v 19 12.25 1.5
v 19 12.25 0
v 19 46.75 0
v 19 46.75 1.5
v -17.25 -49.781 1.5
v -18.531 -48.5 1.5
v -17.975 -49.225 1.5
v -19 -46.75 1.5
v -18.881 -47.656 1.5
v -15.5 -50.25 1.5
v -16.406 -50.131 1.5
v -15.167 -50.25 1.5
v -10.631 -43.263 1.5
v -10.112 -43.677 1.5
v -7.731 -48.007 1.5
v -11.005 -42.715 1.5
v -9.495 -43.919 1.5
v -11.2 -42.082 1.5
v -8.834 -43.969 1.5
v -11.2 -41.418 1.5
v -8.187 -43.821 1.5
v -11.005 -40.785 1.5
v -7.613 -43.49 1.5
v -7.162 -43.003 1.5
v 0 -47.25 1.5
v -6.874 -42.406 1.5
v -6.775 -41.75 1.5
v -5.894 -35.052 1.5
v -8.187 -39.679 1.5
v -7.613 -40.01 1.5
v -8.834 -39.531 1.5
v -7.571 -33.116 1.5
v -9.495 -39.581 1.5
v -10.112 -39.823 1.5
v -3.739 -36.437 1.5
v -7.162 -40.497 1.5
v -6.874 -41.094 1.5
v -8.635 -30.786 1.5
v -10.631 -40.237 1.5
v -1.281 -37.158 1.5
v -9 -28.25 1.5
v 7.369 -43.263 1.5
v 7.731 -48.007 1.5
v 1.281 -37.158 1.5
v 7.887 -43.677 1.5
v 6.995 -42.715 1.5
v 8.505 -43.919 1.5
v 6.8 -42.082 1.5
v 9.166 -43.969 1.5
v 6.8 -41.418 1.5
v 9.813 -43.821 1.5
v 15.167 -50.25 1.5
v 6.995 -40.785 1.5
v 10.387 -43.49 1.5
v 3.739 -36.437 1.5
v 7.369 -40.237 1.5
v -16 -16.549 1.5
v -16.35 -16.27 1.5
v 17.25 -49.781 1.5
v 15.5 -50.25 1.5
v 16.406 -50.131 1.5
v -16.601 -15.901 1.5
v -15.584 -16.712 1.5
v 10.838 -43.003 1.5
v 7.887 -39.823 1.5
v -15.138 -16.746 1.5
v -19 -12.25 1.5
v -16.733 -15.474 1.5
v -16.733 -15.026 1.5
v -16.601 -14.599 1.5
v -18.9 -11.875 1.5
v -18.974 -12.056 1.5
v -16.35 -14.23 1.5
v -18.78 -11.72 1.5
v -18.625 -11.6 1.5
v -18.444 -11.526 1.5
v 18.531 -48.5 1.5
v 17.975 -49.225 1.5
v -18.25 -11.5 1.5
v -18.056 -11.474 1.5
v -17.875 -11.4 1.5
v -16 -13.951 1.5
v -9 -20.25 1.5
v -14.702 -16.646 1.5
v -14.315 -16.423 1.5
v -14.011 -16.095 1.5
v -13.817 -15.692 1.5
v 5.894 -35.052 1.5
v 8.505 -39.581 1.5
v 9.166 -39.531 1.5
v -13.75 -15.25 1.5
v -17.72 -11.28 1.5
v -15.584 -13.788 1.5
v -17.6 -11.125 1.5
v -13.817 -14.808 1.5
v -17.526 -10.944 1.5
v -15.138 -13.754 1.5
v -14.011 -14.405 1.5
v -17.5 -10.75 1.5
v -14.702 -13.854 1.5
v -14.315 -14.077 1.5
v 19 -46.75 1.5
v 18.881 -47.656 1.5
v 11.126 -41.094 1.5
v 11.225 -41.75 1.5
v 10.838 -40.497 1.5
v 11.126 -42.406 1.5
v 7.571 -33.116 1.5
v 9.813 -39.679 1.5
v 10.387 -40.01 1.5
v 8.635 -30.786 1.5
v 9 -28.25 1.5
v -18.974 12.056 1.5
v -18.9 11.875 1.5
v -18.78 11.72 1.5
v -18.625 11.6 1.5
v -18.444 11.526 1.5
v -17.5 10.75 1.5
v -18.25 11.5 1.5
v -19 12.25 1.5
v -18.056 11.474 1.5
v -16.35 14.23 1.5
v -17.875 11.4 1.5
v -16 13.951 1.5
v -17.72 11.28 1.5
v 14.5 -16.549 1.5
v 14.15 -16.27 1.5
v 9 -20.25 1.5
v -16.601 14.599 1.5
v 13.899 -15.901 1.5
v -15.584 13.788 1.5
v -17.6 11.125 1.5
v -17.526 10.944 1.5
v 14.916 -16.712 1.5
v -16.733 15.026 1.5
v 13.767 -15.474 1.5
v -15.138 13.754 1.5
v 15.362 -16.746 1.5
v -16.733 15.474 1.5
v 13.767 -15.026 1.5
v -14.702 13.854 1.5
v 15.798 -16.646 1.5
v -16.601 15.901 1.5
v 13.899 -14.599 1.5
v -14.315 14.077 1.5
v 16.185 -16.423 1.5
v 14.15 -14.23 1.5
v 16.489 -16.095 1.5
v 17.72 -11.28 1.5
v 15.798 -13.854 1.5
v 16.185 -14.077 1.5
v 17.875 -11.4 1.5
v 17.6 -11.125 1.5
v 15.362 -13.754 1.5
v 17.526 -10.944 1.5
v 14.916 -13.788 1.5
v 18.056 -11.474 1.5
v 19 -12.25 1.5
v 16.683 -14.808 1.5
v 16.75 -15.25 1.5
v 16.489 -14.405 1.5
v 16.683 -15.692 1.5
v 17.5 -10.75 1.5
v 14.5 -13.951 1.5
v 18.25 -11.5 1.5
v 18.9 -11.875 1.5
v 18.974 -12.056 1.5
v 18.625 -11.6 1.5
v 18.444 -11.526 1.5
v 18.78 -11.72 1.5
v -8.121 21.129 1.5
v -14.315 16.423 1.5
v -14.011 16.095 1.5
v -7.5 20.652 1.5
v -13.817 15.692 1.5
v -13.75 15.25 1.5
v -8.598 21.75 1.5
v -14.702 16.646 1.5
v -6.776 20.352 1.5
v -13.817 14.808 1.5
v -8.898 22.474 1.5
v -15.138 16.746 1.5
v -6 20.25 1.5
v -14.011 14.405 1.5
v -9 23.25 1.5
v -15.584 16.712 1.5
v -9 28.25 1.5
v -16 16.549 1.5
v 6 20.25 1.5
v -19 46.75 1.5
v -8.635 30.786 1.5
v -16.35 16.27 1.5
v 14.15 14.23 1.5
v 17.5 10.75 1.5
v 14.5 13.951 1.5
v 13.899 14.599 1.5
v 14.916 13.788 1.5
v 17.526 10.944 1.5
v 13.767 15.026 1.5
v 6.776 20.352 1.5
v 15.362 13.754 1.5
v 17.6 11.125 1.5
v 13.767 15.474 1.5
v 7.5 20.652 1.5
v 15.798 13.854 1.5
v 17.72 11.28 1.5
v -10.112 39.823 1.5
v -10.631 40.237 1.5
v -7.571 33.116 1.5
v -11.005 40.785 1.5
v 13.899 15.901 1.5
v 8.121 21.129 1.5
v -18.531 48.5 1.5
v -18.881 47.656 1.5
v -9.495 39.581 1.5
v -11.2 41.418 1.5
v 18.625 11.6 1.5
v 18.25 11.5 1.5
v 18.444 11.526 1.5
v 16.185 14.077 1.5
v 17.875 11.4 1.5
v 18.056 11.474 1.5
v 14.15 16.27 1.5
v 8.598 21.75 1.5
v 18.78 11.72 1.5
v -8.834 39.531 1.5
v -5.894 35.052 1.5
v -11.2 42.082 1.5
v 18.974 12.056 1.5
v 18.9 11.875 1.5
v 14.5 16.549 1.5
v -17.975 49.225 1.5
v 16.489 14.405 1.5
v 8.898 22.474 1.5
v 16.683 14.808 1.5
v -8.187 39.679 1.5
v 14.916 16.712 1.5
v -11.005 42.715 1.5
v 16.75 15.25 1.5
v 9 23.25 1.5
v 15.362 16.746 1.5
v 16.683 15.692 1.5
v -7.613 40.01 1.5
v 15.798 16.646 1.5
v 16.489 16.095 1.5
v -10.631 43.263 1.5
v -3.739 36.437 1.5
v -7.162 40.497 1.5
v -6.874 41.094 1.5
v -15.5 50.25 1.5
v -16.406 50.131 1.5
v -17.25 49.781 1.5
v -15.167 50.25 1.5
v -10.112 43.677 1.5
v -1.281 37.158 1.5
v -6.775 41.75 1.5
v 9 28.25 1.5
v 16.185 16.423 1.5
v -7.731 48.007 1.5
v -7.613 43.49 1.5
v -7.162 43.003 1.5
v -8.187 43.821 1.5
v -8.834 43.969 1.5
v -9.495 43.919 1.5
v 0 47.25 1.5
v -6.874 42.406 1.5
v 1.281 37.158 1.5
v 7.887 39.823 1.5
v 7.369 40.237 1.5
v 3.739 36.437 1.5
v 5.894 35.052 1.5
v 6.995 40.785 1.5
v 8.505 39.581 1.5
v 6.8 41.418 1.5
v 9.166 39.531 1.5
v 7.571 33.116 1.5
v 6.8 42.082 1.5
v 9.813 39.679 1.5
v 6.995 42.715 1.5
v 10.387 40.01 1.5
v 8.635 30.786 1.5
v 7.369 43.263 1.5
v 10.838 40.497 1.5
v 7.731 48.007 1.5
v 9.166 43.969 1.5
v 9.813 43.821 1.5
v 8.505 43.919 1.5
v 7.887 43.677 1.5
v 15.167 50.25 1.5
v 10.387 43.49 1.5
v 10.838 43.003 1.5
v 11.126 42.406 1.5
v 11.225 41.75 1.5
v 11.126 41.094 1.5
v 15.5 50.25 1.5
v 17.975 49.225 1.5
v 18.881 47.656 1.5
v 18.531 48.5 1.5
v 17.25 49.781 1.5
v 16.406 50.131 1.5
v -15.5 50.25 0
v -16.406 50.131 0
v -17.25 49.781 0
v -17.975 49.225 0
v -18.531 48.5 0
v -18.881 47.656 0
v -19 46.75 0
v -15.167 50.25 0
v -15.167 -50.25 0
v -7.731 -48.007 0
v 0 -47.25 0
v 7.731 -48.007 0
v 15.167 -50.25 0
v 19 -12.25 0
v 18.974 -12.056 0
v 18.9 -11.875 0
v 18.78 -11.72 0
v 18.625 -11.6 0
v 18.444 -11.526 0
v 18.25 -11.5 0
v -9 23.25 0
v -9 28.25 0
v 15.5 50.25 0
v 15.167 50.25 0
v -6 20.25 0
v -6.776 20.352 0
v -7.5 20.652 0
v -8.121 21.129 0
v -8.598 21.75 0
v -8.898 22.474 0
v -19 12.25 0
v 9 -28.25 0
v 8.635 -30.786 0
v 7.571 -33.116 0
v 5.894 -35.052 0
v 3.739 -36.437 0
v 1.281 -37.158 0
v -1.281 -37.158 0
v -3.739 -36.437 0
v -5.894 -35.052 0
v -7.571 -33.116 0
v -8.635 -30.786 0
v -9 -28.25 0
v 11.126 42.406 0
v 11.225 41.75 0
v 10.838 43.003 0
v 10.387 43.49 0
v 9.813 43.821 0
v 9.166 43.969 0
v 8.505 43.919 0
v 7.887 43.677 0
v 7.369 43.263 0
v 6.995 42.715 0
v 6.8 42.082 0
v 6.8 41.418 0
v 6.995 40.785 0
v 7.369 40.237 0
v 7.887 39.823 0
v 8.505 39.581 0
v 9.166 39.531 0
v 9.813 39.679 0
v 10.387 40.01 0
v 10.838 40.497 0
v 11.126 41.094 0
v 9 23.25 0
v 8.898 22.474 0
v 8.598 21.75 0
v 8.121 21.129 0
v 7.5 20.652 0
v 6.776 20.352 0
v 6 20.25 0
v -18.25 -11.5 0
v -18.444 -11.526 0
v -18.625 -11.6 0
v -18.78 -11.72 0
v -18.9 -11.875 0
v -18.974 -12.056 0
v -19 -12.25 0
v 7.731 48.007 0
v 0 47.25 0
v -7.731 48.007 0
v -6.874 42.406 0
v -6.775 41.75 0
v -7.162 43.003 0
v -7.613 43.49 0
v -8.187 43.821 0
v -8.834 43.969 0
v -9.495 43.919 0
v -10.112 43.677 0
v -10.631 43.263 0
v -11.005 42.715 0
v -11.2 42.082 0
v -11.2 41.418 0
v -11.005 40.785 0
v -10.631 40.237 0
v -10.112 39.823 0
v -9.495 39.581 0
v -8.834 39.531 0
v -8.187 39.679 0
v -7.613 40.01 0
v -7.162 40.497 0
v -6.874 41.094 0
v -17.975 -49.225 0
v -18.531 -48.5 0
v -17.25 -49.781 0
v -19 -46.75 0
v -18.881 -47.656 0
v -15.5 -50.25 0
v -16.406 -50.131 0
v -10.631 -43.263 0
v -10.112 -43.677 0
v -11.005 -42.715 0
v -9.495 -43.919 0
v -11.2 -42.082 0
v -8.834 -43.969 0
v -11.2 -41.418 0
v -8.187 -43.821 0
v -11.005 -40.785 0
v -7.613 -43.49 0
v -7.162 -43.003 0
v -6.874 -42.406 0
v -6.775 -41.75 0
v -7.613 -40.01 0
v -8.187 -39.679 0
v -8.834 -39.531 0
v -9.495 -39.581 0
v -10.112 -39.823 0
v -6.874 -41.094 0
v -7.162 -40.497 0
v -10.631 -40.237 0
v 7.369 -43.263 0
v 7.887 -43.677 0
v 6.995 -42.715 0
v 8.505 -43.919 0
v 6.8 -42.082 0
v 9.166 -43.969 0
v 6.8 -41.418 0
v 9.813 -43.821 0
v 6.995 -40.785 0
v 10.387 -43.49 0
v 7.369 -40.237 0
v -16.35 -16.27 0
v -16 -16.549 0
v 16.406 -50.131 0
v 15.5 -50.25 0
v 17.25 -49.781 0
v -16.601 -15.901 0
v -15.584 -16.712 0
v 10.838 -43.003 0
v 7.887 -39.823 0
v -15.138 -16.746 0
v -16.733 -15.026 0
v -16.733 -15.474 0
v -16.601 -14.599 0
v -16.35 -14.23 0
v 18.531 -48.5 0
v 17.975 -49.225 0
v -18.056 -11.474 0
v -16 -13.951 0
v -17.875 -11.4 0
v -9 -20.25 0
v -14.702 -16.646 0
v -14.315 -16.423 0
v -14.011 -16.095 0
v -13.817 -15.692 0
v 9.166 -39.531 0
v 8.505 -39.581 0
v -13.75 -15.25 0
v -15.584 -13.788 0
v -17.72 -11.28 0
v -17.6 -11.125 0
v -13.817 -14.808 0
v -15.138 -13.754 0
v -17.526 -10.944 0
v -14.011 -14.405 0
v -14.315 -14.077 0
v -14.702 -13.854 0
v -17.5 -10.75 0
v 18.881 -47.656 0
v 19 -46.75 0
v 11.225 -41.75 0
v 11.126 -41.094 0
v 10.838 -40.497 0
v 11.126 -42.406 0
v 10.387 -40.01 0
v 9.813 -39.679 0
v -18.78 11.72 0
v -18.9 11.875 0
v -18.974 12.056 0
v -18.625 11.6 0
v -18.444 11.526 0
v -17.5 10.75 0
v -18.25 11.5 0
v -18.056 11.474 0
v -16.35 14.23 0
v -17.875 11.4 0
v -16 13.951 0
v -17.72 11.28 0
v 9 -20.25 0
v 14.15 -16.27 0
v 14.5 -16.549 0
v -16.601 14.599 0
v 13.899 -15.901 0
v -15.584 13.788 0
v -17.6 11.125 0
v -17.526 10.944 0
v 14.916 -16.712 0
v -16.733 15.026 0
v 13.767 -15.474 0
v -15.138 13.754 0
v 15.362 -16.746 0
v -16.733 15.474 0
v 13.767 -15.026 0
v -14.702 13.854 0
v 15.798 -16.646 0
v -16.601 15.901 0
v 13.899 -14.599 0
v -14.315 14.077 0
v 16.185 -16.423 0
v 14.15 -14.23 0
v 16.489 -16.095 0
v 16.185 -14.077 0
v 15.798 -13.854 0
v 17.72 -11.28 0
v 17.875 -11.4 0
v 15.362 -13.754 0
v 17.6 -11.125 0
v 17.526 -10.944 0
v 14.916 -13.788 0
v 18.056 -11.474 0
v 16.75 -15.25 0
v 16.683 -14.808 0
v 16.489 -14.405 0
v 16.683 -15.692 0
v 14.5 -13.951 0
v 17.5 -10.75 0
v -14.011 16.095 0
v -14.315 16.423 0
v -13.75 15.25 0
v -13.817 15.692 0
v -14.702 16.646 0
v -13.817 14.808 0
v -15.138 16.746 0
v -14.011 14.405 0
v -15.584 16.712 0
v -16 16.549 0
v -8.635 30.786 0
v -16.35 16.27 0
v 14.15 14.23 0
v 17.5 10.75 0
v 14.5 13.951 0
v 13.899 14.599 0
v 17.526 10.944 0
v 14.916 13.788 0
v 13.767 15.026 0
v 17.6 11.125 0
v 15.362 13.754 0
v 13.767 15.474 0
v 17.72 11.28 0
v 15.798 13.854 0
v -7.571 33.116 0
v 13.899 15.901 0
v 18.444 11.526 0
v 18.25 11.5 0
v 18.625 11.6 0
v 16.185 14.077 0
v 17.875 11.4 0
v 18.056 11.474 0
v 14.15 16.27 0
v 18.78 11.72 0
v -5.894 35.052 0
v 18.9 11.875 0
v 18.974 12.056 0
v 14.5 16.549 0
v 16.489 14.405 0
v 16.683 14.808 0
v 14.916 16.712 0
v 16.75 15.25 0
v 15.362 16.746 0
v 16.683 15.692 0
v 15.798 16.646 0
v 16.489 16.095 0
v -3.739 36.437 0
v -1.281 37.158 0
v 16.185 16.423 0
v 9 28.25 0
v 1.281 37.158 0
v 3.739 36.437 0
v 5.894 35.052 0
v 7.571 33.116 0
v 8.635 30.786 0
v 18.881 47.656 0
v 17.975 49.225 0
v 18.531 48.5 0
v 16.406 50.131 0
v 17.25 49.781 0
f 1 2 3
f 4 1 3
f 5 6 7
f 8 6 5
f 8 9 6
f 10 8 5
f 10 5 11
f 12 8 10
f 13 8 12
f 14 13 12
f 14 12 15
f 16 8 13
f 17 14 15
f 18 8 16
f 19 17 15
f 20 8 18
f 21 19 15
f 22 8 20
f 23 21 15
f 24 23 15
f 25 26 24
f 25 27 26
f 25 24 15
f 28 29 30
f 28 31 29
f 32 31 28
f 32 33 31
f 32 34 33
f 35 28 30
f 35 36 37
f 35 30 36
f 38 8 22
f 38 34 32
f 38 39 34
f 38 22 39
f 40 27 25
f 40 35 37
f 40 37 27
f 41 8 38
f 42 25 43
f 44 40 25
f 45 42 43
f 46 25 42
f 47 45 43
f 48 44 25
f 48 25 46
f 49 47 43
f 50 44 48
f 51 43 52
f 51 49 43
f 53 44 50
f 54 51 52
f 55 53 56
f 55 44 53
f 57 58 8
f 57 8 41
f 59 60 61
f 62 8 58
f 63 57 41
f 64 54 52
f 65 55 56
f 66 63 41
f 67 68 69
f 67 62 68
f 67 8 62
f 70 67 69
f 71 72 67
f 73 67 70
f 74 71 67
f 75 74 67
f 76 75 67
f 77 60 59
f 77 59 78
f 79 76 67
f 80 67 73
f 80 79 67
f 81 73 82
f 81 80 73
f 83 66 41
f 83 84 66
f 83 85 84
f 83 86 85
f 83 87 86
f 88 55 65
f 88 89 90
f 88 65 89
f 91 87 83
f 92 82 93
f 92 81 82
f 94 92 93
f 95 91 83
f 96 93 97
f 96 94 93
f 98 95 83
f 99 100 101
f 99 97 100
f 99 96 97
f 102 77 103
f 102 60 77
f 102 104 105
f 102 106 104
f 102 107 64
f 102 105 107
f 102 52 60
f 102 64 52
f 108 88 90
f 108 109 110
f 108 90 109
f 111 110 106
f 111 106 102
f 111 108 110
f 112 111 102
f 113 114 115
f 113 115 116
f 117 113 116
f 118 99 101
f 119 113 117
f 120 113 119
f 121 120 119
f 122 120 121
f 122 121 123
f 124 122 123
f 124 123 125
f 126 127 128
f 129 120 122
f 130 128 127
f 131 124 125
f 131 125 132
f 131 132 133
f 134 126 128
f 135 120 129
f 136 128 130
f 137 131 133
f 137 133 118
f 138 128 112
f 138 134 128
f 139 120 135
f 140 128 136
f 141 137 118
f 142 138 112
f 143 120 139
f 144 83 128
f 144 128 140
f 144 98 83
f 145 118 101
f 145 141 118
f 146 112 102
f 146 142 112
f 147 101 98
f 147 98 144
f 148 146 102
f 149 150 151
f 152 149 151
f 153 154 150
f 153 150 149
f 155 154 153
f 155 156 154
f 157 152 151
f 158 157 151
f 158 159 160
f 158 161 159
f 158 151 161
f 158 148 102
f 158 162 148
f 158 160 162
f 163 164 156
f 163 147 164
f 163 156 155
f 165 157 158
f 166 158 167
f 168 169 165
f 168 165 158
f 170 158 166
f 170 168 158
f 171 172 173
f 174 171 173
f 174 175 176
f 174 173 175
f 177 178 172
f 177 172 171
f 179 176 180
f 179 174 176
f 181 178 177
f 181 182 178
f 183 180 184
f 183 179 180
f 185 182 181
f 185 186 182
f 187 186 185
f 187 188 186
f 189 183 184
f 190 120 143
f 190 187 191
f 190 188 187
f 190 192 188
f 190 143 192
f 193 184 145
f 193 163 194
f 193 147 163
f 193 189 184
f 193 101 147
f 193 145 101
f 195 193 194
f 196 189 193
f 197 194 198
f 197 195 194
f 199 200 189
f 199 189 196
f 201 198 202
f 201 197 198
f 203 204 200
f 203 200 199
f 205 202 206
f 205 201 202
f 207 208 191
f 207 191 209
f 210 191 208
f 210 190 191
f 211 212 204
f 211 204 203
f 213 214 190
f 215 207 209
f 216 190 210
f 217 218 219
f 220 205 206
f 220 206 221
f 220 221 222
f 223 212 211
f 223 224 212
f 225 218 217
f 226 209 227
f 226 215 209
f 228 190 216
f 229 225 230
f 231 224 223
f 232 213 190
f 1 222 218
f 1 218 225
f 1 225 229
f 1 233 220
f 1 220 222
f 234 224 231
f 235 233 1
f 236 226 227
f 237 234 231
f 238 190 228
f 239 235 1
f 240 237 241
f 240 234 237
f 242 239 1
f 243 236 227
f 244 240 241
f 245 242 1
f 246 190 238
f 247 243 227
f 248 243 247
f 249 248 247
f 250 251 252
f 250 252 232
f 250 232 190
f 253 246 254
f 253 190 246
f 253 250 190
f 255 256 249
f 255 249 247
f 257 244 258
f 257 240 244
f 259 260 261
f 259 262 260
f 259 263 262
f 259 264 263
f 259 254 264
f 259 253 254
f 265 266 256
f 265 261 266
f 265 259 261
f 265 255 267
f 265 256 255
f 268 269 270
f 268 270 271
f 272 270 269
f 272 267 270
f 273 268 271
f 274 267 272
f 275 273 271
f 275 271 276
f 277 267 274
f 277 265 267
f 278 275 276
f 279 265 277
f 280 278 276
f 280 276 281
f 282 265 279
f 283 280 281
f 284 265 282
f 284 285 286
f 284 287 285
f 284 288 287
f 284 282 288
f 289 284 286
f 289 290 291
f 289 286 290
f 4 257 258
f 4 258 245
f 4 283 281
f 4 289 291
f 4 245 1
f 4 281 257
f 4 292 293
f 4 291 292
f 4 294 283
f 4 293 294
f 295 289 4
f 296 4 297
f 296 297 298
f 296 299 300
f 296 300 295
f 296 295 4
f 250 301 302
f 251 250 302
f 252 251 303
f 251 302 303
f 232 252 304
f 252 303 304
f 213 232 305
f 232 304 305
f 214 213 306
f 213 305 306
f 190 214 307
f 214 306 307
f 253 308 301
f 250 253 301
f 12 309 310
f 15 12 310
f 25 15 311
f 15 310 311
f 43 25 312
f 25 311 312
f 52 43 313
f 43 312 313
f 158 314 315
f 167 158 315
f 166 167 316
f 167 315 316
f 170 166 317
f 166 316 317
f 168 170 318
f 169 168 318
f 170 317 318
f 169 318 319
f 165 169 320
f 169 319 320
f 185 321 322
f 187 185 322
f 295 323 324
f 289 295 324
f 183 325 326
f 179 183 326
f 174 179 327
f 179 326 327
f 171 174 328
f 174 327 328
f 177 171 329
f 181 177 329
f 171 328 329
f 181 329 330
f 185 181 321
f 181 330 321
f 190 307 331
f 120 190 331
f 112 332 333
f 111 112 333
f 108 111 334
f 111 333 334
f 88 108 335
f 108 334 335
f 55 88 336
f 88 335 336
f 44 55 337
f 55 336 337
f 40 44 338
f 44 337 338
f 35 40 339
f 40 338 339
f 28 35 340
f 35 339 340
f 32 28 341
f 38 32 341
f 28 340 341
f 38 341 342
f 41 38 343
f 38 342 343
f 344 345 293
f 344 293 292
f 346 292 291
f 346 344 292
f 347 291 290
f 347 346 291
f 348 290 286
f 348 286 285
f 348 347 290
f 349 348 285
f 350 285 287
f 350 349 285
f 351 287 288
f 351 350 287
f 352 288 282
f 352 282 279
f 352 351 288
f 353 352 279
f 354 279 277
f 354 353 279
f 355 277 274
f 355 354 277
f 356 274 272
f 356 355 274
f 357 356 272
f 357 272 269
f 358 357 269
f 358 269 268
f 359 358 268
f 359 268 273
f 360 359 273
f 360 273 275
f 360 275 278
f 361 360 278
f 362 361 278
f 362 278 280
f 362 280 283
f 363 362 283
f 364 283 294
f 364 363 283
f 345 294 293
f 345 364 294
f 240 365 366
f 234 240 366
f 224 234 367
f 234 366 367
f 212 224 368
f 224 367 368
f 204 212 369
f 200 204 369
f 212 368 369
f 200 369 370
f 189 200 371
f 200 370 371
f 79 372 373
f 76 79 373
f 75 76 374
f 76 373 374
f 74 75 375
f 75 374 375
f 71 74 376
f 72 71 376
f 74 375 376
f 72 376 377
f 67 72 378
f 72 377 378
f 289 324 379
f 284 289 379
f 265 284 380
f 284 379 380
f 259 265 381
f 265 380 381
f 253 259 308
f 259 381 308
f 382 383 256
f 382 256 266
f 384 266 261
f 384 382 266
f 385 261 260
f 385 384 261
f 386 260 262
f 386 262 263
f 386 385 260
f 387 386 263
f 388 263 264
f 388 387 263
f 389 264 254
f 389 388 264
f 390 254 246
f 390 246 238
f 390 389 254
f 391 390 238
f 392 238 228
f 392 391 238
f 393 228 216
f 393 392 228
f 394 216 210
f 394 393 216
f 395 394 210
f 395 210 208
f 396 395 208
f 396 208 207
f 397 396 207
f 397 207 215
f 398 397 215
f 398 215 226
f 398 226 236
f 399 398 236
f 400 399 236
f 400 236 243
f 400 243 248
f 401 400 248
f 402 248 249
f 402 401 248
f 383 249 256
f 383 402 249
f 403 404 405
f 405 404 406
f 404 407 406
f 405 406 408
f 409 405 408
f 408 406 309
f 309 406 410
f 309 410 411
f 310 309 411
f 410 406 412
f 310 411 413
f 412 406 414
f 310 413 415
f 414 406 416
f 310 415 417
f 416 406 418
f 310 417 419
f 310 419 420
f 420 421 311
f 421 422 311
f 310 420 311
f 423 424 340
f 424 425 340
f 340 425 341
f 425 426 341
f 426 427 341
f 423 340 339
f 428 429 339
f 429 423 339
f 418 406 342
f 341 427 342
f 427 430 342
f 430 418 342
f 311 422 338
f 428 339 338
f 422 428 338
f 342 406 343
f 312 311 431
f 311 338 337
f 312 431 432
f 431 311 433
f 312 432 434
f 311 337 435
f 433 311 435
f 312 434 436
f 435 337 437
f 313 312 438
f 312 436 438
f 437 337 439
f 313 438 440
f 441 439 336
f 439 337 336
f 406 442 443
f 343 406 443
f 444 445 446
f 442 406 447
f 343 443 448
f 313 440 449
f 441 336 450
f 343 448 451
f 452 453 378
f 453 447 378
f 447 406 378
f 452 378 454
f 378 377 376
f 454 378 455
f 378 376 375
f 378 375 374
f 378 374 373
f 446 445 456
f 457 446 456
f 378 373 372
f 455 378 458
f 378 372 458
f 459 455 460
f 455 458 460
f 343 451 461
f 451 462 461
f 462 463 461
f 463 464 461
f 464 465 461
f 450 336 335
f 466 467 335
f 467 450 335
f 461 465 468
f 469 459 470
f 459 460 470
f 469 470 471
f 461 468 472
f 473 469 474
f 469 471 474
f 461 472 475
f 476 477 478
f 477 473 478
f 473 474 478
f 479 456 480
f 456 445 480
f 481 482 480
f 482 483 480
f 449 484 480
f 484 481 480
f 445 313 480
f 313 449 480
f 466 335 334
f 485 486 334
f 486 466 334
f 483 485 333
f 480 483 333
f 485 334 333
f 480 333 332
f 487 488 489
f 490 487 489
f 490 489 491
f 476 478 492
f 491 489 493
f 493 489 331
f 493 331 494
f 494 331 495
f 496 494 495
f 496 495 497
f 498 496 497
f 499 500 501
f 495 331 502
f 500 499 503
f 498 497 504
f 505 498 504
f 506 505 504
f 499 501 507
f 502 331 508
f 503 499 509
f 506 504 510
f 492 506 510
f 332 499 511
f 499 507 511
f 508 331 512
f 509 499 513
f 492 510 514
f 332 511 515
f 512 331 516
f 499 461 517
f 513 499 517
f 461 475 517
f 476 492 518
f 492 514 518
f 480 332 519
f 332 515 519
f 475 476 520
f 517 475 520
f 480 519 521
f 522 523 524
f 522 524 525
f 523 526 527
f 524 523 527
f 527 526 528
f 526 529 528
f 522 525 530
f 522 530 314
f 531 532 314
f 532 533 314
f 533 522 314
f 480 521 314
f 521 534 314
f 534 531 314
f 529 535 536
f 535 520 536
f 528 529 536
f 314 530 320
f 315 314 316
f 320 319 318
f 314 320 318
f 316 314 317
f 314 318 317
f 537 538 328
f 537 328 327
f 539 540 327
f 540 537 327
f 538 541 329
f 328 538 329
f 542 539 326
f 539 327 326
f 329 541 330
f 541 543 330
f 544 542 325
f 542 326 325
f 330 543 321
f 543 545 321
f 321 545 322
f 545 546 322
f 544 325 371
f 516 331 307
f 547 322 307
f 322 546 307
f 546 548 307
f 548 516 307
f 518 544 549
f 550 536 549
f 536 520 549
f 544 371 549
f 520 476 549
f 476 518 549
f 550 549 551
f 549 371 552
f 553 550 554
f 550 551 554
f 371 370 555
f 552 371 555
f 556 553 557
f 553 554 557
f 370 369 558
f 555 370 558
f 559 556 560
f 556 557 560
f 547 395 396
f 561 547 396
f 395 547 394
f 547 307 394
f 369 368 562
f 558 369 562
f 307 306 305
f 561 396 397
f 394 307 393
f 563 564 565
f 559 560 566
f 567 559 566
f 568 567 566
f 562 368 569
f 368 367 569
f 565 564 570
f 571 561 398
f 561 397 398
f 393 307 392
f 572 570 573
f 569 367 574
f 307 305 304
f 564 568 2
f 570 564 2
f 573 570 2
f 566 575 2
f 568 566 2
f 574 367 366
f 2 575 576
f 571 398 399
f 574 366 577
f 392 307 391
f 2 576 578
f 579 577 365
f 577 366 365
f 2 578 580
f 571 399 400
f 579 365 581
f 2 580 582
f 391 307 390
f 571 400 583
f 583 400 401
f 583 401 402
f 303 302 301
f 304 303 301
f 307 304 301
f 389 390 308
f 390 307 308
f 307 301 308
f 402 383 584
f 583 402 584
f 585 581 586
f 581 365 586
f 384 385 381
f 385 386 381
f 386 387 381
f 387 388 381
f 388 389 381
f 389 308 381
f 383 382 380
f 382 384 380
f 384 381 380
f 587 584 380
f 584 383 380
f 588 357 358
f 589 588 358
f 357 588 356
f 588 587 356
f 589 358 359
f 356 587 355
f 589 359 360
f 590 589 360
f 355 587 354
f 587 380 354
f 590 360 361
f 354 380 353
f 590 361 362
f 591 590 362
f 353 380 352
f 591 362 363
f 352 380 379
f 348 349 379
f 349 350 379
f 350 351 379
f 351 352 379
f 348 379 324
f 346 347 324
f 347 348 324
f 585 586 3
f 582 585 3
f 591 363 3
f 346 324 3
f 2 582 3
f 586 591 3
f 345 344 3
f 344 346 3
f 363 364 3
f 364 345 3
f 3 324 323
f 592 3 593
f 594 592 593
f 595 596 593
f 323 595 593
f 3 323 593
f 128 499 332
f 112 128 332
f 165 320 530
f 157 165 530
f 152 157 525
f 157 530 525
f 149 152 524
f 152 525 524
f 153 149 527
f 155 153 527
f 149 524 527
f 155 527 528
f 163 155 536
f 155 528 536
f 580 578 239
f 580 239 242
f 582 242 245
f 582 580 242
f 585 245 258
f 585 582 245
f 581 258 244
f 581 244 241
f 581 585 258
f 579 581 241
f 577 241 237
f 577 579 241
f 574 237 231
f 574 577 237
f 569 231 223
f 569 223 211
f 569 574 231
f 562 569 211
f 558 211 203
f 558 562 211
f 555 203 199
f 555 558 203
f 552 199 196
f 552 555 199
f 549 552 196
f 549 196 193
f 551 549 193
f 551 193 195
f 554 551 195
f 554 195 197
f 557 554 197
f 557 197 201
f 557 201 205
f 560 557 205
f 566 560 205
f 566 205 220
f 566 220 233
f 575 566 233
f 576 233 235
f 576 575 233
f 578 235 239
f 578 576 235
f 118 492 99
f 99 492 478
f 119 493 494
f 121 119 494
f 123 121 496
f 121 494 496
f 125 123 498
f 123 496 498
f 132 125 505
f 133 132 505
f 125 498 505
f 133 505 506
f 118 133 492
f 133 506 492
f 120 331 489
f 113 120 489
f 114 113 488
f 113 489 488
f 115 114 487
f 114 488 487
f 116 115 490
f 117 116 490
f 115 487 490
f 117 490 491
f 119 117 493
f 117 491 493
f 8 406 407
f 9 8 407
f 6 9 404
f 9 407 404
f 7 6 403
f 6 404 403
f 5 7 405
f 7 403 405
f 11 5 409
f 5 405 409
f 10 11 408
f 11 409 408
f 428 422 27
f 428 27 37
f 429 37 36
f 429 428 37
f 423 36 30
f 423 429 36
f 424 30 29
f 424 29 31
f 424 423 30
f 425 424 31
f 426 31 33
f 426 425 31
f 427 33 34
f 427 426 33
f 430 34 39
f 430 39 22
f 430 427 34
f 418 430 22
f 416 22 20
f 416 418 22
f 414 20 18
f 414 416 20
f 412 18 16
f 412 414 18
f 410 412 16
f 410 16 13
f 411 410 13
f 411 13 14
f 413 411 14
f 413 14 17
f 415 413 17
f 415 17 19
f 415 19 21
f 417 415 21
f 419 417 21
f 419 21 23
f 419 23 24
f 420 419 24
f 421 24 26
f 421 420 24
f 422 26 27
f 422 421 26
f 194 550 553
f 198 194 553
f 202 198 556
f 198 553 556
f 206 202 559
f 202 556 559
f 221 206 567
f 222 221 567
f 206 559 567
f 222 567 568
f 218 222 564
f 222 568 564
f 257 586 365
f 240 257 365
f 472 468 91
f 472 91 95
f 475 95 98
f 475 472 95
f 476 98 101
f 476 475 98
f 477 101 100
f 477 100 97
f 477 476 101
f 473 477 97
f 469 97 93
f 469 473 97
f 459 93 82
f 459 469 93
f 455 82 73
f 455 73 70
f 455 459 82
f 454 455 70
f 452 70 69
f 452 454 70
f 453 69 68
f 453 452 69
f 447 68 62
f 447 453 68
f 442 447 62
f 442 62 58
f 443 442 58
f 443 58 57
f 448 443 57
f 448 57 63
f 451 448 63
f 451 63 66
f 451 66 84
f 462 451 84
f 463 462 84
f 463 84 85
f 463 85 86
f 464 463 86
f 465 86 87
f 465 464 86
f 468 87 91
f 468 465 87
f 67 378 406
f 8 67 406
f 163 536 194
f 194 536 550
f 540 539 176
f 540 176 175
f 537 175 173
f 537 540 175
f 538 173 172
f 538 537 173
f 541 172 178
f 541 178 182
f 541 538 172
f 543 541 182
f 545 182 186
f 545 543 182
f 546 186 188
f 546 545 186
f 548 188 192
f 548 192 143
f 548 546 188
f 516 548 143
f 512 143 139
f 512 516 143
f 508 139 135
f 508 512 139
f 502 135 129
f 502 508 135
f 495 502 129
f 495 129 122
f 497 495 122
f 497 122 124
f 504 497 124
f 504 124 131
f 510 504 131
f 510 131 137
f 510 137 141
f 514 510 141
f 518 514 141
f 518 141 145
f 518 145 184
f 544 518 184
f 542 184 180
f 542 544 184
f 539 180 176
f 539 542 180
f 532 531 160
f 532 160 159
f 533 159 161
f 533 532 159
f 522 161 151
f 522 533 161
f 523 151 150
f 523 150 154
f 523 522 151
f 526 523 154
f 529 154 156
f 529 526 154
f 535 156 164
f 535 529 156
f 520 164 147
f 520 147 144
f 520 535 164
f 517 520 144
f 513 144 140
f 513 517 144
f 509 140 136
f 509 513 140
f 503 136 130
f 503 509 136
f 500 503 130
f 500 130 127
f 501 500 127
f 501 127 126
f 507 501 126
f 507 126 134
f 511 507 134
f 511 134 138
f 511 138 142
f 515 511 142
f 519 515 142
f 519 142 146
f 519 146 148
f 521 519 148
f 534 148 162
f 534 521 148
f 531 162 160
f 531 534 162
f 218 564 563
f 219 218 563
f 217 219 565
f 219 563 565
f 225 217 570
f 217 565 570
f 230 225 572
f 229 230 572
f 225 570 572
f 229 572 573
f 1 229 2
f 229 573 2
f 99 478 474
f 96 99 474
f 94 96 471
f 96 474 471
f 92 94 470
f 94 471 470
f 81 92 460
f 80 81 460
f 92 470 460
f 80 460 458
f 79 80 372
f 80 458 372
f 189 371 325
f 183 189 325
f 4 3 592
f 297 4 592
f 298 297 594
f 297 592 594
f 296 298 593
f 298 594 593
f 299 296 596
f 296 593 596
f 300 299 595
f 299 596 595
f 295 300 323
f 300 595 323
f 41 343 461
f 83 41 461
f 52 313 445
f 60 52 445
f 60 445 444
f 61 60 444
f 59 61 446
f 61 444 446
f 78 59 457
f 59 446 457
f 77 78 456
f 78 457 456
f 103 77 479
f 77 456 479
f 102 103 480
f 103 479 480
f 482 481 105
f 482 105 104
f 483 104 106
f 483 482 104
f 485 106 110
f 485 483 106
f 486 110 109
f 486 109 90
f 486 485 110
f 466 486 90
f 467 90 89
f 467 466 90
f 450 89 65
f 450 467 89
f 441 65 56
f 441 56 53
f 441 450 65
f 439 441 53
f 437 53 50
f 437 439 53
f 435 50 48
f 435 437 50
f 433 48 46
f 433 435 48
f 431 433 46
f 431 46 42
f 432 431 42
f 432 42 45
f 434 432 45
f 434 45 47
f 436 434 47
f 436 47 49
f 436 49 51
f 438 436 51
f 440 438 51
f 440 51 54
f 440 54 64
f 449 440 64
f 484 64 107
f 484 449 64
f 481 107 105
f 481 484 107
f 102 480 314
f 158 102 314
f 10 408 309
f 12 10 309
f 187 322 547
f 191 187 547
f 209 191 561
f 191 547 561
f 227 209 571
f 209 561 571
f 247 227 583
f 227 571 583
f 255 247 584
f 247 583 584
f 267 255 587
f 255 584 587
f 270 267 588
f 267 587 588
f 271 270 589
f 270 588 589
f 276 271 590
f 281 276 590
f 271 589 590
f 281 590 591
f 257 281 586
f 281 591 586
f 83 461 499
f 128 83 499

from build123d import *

# Parameters (mm, degrees)
F0_R     = 2.225
F0_R_2   = 1.5
F1_DEPTH = 1.5


# Not quite as in the source:
# - ends of sketch curves that miss each other by under 0.0002 mm in the source are joined


with BuildPart() as f1:
    # F0 (on Top) → F1 (new body)
    with BuildSketch(Plane.XY):
        with BuildLine():
            ThreePointArc((15.5, -50.25), (17.9748737342, -49.2248737342), (19, -46.75))
            Line((19, -46.75), (19, -12.25))
            ThreePointArc((19, -12.25), (18.7803300859, -11.7196699141), (18.25, -11.5))
            ThreePointArc((18.25, -11.5), (17.7196699141, -11.2803300859), (17.5, -10.75))
            Line((17.5, -10.75), (17.5, 10.75))
            ThreePointArc((17.5, 10.75), (17.7196699141, 11.2803300859), (18.25, 11.5))
            ThreePointArc((18.25, 11.5), (18.7803300859, 11.7196699141), (19, 12.25))
            Line((19, 12.25), (19, 46.75))
            ThreePointArc((19, 46.75), (17.9748737342, 49.2248737342), (15.5, 50.25))
            Line((15.5, 50.25), (15.167259, 50.25))
            ThreePointArc((15.167259, 50.25), (0, 47.25), (-15.1672590116, 50.2499999718))
            Line((-15.1672590116, 50.2499999718), (-15.5, 50.25))
            ThreePointArc((-15.5, 50.25), (-17.9748737342, 49.2248737342), (-19, 46.75))
            Line((-19, 46.75), (-19, 12.25))
            ThreePointArc((-19, 12.25), (-18.7803300859, 11.7196699141), (-18.25, 11.5))
            ThreePointArc((-18.25, 11.5), (-17.7196699141, 11.2803300859), (-17.5, 10.75))
            Line((-17.5, 10.75), (-17.5, -10.75))
            ThreePointArc((-17.5, -10.75), (-17.7196699141, -11.2803300859), (-18.25, -11.5))
            ThreePointArc((-18.25, -11.5), (-18.7803300859, -11.7196699141), (-19, -12.25))
            Line((-19, -12.25), (-19, -46.75))
            ThreePointArc((-19, -46.75), (-17.9748737342, -49.2248737342), (-15.5, -50.25))
            Line((-15.5, -50.25), (-15.167259, -50.25))
            ThreePointArc((-15.167259, -50.25), (0, -47.249999), (15.1672593636, -50.2499991168))
            Line((15.1672593636, -50.2499991168), (15.5, -50.25))
        make_face()
        with Locations((-9, -41.75)):
            Circle(F0_R, mode=Mode.SUBTRACT)
        with Locations((-15.25, -15.25)):
            Circle(F0_R_2, mode=Mode.SUBTRACT)
        with Locations((9, -41.75)):
            Circle(F0_R, mode=Mode.SUBTRACT)
        with BuildLine():
            Line((-9, -20.25), (9, -20.25))
            Line((9, -20.25), (9, -28.25))
            ThreePointArc((9, -28.25), (0, -37.25), (-9, -28.25))
            Line((-9, -28.25), (-9, -20.25))
        make_face(mode=Mode.SUBTRACT)
        with Locations((15.25, -15.25)):
            Circle(F0_R_2, mode=Mode.SUBTRACT)
        with Locations((-15.25, 15.25)):
            Circle(F0_R_2, mode=Mode.SUBTRACT)
        with Locations((-9, 41.75)):
            Circle(F0_R, mode=Mode.SUBTRACT)
        with Locations((15.25, 15.25)):
            Circle(F0_R_2, mode=Mode.SUBTRACT)
        with BuildLine():
            ThreePointArc((9, 23.25), (8.1213203436, 21.1286796564), (6, 20.25))
            Line((6, 20.25), (-6, 20.25))
            ThreePointArc((-6, 20.25), (-8.1213203436, 21.1286796564), (-9, 23.25))
            Line((-9, 23.25), (-9, 28.25))
            ThreePointArc((-9, 28.25), (0, 37.25), (9, 28.25))
            Line((9, 28.25), (9, 23.25))
        make_face(mode=Mode.SUBTRACT)
        with Locations((9, 41.75)):
            Circle(F0_R, mode=Mode.SUBTRACT)
    extrude(amount=F1_DEPTH)


solid = f1.part
